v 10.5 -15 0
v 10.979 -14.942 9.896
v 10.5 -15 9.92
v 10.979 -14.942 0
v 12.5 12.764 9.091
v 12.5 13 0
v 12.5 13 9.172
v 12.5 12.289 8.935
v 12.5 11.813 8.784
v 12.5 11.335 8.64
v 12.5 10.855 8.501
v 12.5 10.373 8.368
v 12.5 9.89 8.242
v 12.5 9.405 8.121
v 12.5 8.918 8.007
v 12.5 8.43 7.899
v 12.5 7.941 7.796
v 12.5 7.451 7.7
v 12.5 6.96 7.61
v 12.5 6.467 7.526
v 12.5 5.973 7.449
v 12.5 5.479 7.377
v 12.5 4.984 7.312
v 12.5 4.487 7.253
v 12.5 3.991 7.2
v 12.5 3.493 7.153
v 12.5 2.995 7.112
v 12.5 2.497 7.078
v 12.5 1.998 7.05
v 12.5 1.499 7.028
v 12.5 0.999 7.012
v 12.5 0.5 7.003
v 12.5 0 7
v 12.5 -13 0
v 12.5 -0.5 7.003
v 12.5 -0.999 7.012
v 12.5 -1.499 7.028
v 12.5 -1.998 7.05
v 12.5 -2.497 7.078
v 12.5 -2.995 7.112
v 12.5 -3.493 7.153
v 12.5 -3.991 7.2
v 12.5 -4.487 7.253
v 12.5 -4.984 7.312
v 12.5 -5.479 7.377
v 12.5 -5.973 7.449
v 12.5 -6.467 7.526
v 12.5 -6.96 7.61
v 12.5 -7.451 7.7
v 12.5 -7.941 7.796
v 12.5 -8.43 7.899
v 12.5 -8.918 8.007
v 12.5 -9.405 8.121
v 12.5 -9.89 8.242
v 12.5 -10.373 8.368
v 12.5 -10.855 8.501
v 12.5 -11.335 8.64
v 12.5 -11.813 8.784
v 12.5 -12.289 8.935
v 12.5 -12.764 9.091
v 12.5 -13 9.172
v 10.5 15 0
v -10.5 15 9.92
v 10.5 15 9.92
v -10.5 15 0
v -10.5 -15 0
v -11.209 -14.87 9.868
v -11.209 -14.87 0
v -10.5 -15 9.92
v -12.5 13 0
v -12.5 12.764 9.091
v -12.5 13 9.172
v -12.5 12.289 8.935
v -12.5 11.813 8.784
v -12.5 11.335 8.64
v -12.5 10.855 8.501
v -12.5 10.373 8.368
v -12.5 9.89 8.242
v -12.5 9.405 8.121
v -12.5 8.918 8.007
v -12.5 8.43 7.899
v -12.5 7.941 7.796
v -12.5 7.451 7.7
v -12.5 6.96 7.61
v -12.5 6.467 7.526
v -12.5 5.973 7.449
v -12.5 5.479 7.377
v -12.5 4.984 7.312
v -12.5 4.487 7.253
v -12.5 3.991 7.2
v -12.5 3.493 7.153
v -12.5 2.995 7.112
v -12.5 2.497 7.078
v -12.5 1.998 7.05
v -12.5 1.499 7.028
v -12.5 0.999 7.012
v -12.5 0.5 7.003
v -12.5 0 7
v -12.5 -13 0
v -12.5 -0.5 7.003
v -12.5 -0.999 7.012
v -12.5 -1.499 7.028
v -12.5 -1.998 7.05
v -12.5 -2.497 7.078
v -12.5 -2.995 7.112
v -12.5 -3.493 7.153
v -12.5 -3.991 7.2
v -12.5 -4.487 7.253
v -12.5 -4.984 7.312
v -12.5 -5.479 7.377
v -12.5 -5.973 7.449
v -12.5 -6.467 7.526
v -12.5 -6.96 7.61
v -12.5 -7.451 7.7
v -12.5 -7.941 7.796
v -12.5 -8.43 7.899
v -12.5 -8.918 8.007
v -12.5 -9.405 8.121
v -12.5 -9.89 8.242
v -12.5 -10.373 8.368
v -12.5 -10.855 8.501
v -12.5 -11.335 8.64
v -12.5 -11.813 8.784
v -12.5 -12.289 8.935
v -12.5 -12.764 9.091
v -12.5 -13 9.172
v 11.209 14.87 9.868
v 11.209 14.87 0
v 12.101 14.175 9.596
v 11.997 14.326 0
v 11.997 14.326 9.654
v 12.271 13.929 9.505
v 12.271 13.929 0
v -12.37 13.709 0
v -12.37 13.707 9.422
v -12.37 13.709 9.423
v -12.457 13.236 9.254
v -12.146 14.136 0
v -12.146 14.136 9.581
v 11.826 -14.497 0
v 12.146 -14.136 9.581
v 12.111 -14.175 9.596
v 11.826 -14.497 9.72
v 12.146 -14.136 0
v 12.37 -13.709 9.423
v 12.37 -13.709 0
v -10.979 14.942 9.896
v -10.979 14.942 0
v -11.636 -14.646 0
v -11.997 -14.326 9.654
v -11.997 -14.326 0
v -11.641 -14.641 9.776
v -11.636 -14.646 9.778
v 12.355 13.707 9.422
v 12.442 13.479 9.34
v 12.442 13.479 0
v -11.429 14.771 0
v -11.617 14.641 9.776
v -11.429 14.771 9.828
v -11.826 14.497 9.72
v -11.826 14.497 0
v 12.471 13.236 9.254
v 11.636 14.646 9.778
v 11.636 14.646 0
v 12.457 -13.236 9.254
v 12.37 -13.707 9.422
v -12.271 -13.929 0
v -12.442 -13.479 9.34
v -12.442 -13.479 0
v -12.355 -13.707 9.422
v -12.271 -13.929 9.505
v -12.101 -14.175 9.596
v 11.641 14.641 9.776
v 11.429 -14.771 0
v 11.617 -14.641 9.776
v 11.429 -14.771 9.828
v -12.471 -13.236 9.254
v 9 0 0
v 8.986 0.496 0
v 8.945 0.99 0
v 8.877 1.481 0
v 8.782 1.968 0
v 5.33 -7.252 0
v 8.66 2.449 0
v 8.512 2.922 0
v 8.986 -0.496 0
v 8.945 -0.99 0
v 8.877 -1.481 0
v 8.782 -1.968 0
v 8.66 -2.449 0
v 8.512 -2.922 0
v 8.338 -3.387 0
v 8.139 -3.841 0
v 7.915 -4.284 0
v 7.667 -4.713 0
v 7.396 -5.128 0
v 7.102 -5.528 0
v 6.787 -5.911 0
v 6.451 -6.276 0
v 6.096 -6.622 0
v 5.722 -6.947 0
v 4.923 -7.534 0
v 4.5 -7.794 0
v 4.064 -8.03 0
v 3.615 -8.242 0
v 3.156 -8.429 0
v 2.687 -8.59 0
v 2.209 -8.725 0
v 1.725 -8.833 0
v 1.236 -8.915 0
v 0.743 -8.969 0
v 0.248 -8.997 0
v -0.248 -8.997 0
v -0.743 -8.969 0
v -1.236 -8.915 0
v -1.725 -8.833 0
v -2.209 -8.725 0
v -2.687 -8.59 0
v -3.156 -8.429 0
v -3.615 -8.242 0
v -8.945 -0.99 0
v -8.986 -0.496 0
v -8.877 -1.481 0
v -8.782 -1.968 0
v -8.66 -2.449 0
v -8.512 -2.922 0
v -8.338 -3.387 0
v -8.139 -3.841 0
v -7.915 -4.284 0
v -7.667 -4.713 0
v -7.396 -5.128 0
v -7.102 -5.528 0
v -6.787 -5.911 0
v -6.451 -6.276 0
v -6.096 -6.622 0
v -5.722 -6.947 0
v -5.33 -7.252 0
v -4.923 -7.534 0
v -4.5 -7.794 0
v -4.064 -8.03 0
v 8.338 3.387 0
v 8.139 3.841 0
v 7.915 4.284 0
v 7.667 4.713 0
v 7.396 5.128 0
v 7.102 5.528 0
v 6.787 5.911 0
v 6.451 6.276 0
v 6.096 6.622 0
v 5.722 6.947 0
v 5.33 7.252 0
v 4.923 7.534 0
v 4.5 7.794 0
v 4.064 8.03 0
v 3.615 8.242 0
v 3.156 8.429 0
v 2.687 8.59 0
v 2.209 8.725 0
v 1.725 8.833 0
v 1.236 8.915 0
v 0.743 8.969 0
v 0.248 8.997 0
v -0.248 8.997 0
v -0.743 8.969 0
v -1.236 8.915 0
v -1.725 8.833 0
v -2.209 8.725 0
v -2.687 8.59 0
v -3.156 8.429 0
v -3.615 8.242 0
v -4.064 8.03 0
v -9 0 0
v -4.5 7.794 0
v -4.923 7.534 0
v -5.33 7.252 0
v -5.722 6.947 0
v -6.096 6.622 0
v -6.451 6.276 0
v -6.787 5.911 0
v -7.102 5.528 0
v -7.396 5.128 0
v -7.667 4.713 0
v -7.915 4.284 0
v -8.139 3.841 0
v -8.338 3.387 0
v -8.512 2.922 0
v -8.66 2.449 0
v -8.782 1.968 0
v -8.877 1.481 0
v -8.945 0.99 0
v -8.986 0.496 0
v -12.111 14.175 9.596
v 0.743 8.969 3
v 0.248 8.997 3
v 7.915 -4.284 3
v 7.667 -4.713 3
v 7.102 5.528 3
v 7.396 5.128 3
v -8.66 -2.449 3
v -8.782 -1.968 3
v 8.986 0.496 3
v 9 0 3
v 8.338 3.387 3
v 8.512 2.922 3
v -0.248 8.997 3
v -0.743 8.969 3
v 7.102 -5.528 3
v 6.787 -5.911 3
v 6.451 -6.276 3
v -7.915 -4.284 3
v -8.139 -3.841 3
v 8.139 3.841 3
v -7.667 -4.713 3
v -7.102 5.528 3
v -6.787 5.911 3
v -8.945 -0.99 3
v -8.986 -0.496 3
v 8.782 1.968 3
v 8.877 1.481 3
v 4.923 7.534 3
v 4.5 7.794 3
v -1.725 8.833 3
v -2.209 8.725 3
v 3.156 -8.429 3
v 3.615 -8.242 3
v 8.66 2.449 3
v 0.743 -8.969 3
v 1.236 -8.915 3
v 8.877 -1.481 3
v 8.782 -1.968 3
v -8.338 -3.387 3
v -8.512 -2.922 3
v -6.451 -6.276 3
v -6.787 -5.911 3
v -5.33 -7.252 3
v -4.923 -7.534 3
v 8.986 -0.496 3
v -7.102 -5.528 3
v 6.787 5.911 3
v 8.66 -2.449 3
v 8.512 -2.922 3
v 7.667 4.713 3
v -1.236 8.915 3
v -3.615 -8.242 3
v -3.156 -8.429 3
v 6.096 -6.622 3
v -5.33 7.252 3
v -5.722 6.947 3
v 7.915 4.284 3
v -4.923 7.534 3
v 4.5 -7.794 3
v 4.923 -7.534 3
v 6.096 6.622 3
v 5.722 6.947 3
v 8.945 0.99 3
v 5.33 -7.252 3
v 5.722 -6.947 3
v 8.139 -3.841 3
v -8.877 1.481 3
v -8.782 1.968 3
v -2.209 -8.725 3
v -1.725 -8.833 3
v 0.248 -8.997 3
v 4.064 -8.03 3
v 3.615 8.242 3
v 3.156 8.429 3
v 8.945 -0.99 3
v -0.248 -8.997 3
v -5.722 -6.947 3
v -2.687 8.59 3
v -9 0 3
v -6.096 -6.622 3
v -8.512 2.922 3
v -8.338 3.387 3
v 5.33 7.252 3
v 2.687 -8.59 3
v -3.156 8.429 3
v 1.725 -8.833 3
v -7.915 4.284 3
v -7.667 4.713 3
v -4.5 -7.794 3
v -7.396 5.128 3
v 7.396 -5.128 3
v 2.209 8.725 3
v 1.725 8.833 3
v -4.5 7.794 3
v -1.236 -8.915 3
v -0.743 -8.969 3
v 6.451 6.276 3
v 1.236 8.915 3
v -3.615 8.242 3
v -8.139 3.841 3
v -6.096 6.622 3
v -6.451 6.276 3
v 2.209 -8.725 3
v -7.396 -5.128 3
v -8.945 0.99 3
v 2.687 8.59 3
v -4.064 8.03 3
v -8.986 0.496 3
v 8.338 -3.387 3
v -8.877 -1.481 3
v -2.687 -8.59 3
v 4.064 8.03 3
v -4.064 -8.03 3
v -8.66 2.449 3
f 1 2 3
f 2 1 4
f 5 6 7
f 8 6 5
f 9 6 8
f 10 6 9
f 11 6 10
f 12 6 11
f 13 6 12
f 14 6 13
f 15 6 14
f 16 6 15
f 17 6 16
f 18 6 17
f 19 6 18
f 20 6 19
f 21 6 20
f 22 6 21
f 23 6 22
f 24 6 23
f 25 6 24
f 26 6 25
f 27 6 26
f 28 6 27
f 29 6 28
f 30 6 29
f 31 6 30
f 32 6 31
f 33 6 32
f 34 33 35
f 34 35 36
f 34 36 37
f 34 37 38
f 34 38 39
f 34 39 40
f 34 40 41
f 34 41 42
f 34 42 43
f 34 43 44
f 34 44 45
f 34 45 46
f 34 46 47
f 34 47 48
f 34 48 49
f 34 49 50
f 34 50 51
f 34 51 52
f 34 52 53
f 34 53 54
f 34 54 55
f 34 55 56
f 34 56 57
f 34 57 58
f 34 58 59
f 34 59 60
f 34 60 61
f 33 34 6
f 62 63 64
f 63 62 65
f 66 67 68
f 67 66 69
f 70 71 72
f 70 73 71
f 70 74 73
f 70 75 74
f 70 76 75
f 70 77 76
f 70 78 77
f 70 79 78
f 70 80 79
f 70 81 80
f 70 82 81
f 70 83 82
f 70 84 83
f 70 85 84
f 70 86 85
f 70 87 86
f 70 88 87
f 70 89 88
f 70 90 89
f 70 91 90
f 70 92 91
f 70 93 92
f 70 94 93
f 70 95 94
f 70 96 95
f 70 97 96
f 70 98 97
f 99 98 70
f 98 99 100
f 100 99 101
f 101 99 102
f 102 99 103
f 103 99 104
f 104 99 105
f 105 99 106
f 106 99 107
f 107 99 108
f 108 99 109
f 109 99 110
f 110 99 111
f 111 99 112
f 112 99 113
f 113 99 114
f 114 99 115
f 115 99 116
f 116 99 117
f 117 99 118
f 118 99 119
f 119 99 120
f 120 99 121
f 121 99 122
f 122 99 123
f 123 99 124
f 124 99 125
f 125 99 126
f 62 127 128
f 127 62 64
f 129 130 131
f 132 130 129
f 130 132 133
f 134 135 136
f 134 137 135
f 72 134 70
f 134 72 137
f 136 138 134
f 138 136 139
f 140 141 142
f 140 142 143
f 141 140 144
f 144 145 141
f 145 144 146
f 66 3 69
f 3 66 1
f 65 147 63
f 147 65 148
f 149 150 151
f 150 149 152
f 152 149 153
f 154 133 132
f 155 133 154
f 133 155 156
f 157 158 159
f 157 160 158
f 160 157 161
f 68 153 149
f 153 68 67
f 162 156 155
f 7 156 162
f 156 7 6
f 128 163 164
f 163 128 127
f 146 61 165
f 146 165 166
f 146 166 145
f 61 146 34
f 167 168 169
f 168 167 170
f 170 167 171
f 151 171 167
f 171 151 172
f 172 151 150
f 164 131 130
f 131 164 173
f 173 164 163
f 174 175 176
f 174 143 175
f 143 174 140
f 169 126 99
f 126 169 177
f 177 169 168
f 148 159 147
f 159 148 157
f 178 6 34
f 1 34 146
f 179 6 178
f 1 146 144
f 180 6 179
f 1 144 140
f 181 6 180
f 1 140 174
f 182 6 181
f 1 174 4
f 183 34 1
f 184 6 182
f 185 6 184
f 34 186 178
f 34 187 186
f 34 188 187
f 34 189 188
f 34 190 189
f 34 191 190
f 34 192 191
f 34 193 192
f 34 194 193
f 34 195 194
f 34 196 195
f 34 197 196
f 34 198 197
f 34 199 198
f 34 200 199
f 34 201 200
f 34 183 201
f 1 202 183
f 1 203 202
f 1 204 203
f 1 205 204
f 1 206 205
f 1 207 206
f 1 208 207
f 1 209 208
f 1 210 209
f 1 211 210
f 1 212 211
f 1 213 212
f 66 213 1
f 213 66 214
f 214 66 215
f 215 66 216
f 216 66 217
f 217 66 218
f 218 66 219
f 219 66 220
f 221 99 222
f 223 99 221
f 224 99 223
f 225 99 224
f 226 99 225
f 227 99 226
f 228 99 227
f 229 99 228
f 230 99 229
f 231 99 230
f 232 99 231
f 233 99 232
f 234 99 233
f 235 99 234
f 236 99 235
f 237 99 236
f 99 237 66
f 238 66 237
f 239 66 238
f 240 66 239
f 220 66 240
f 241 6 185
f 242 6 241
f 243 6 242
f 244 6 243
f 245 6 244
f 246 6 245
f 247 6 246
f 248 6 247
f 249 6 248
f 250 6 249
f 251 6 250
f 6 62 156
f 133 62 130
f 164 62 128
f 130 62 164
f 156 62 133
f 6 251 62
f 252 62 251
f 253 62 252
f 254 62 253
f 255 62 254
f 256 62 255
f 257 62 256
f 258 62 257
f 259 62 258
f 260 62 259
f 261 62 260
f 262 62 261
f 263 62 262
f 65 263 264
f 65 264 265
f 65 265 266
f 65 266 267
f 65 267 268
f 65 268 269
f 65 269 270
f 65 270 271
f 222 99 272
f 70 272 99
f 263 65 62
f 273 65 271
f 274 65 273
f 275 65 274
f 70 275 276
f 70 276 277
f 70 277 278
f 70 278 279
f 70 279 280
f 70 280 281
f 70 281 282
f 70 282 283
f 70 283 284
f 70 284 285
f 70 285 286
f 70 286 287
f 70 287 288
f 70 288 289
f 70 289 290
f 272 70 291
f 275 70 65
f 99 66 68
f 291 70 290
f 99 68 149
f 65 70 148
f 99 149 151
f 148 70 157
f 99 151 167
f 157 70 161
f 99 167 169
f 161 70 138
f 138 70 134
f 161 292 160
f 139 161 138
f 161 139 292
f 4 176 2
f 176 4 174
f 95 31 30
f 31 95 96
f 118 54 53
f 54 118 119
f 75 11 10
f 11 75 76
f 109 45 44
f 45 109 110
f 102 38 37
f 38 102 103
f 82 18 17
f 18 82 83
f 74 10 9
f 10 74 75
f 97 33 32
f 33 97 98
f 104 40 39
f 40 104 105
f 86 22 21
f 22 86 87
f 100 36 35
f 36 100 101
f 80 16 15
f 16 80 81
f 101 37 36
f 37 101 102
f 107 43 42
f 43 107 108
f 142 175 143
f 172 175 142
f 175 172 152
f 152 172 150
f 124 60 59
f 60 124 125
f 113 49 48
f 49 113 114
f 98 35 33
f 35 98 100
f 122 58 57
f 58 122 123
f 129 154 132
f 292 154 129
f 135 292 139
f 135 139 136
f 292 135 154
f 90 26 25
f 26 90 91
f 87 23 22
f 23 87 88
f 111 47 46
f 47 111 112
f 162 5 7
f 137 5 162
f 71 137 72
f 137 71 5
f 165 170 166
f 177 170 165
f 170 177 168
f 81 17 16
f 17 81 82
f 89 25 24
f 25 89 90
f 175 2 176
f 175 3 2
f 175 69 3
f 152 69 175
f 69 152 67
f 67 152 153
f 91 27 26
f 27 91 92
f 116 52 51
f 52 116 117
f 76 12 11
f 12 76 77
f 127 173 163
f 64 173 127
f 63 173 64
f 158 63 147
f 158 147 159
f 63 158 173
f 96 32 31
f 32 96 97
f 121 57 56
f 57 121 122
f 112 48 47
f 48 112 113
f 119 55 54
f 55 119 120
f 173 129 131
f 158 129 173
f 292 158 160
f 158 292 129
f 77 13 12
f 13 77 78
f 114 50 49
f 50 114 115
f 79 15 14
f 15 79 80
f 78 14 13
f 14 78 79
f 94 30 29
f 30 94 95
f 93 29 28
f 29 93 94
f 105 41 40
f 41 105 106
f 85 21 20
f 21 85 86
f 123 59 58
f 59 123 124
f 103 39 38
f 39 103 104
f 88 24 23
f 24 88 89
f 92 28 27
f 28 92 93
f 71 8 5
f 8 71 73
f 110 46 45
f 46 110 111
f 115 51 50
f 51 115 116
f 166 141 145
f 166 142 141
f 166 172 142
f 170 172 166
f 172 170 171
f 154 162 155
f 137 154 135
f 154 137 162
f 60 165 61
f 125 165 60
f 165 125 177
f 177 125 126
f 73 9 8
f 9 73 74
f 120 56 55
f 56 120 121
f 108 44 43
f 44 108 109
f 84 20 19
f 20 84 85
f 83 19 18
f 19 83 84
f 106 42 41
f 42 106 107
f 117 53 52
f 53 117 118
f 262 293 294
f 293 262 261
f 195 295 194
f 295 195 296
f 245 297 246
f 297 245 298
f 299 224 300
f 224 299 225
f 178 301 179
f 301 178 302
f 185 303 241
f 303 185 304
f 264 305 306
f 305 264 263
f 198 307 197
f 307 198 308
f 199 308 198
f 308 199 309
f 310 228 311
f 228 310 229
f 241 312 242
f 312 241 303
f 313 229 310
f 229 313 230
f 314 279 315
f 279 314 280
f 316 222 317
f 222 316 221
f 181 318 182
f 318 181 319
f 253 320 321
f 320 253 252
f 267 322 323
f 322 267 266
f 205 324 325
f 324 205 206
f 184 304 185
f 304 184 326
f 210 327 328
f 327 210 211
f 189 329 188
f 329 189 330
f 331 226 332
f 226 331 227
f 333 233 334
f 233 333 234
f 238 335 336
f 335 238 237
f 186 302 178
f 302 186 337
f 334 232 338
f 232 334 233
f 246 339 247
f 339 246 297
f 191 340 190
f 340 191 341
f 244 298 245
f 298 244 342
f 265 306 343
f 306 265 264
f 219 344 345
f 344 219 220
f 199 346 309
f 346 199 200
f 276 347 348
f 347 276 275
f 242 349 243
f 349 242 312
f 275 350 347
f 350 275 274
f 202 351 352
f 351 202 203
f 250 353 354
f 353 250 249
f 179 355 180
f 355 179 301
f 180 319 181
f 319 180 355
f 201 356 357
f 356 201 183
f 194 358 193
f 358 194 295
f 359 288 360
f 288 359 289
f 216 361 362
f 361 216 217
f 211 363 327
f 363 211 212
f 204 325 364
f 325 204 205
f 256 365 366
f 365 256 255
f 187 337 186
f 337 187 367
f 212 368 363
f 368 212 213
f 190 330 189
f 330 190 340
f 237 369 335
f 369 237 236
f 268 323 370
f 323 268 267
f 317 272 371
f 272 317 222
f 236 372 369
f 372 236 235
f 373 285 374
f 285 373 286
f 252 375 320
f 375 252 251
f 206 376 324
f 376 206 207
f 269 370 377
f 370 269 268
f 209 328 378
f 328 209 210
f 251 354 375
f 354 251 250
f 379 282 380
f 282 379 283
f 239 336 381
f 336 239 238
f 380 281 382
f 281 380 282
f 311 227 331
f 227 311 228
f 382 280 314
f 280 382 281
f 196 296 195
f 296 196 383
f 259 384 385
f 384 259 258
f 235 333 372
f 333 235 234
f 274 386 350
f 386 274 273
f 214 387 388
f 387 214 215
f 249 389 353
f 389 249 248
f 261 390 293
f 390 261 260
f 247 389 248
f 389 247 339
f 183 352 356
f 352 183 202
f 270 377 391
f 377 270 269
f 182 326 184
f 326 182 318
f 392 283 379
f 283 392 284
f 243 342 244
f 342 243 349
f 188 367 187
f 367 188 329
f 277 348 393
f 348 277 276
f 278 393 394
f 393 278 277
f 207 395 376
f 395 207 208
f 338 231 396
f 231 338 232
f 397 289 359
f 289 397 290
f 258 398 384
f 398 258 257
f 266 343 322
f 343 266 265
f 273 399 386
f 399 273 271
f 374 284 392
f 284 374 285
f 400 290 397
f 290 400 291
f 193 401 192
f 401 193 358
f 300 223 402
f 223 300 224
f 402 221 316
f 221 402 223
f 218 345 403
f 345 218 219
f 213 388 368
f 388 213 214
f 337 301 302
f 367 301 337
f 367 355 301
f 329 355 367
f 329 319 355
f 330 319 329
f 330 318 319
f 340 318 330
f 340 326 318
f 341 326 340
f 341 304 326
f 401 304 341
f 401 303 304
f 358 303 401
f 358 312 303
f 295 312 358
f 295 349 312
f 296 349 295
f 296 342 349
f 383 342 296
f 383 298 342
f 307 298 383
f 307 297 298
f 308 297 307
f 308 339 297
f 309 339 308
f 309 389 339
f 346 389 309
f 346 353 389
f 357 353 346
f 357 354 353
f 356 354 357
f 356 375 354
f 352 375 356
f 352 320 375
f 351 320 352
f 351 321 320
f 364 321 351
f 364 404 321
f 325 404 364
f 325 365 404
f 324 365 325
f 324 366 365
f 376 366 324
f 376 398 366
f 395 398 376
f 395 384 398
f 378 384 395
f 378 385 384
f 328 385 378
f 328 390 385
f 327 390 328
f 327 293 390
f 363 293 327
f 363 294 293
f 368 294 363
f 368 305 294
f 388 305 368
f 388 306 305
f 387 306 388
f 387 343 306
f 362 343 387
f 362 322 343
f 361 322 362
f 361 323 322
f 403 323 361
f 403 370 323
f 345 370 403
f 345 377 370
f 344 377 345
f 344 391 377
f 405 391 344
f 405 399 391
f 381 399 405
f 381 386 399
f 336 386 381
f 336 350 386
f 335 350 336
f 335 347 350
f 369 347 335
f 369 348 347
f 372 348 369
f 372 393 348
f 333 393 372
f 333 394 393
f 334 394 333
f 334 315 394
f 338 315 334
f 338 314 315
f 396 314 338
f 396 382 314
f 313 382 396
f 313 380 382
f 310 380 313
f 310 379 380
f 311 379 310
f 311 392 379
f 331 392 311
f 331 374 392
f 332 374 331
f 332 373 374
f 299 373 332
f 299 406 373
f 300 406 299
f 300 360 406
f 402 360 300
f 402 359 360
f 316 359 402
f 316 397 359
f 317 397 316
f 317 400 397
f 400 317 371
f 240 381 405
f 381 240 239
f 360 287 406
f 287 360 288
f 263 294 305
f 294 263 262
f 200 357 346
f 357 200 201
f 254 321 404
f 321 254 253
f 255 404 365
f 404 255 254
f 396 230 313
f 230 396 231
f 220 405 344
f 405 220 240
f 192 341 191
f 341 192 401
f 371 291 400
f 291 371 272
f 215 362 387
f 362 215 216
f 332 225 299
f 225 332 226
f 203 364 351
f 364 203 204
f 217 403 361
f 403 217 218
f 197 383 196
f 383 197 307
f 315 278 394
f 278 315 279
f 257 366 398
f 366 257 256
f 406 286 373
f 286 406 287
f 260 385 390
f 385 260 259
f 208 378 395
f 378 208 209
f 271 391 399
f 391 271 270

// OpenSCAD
//Tools that couple with a weird clamp I have to press guitar frets into fingerboard
//or to hold them in place during glueing
//Initially designed to fix my 8 string

$fs=1/2;
$fa=1/2;
bsl=1/100;

part="neck_support";//[fret_press, neck_support]

radius_fretboard=16*25.4; //fret is bent to this radius
radius_fret=1.75; //curvature of a fret crown
radius_neck=40; //curvature of back side of the neck
rounding=2; //fillet

length_fret=55; //neck width or more if multiscale
support_block=[25,30]; //back side of the neck
support_thickness=4; //extra material in neck support to distribute the load

press_width=10; //fret-pressing part as it widens
press_thickness=4; //extra material in fret press to distribute the load
clamp_size=18; //diameter of the clamp coupling
clamp_depth=3; //depression for the clamp to be locked in

module neck_support() {
  difference() {
    linear_extrude(radius_neck) {
      offset(r=rounding) offset(r=-rounding) square(support_block,center=true);
    }
   translate([0,0,radius_neck+support_thickness+clamp_depth])rotate([0,90,0])cylinder(r=radius_neck,h=max(support_block)+bsl,center=true);
   translate([0,0,-bsl]) cylinder(d=clamp_size,h=clamp_depth+bsl);
  }
}

if (part=="fret_press") fret_press_holder();
if (part=="neck_support") neck_support();
if (part=="debug") fret_press();

module dome(d,h) {
  translate([0,0,h]) intersection() {
    sphere(d=d);
    cylinder(d=d,h=d/2);
  }
  cylinder(d=d,h=h);
}

module blank() {
  difference() {
    hull() {
      translate([0,0,-press_thickness-length_fret/2+clamp_size/2+clamp_depth]) {
        dome(d=clamp_size+2*clamp_depth,h=clamp_depth);
      }
      for (tr=[[-length_fret/2+rounding,-press_width/2+rounding],
              [-length_fret/2+rounding,press_width/2-rounding],
              [length_fret/2-rounding,-press_width/2+rounding],
              [length_fret/2-rounding,press_width/2-rounding]]) {
        translate(tr) mirror([0,0,1]) dome(d=rounding,h=press_thickness);
      }
    }
    translate([0,0,-press_thickness-length_fret/2+clamp_size/2+clamp_depth-bsl]) {
      cylinder(d=clamp_size,h=clamp_depth);
    }
  }
}

module profile() {
  translate([-radius_fret,0]) {
    rotate(-45) difference() {
      square(100,center=true);
      square(100);
    }
    circle(r=radius_fret);
  }
}

module fret_press_holder() {
  difference() {
    blank();
    translate([0,0,radius_fretboard-radius_fret])rotate([90,0,0]) {
      rotate_extrude() translate([radius_fretboard,0]) profile();
    }
  }
}
